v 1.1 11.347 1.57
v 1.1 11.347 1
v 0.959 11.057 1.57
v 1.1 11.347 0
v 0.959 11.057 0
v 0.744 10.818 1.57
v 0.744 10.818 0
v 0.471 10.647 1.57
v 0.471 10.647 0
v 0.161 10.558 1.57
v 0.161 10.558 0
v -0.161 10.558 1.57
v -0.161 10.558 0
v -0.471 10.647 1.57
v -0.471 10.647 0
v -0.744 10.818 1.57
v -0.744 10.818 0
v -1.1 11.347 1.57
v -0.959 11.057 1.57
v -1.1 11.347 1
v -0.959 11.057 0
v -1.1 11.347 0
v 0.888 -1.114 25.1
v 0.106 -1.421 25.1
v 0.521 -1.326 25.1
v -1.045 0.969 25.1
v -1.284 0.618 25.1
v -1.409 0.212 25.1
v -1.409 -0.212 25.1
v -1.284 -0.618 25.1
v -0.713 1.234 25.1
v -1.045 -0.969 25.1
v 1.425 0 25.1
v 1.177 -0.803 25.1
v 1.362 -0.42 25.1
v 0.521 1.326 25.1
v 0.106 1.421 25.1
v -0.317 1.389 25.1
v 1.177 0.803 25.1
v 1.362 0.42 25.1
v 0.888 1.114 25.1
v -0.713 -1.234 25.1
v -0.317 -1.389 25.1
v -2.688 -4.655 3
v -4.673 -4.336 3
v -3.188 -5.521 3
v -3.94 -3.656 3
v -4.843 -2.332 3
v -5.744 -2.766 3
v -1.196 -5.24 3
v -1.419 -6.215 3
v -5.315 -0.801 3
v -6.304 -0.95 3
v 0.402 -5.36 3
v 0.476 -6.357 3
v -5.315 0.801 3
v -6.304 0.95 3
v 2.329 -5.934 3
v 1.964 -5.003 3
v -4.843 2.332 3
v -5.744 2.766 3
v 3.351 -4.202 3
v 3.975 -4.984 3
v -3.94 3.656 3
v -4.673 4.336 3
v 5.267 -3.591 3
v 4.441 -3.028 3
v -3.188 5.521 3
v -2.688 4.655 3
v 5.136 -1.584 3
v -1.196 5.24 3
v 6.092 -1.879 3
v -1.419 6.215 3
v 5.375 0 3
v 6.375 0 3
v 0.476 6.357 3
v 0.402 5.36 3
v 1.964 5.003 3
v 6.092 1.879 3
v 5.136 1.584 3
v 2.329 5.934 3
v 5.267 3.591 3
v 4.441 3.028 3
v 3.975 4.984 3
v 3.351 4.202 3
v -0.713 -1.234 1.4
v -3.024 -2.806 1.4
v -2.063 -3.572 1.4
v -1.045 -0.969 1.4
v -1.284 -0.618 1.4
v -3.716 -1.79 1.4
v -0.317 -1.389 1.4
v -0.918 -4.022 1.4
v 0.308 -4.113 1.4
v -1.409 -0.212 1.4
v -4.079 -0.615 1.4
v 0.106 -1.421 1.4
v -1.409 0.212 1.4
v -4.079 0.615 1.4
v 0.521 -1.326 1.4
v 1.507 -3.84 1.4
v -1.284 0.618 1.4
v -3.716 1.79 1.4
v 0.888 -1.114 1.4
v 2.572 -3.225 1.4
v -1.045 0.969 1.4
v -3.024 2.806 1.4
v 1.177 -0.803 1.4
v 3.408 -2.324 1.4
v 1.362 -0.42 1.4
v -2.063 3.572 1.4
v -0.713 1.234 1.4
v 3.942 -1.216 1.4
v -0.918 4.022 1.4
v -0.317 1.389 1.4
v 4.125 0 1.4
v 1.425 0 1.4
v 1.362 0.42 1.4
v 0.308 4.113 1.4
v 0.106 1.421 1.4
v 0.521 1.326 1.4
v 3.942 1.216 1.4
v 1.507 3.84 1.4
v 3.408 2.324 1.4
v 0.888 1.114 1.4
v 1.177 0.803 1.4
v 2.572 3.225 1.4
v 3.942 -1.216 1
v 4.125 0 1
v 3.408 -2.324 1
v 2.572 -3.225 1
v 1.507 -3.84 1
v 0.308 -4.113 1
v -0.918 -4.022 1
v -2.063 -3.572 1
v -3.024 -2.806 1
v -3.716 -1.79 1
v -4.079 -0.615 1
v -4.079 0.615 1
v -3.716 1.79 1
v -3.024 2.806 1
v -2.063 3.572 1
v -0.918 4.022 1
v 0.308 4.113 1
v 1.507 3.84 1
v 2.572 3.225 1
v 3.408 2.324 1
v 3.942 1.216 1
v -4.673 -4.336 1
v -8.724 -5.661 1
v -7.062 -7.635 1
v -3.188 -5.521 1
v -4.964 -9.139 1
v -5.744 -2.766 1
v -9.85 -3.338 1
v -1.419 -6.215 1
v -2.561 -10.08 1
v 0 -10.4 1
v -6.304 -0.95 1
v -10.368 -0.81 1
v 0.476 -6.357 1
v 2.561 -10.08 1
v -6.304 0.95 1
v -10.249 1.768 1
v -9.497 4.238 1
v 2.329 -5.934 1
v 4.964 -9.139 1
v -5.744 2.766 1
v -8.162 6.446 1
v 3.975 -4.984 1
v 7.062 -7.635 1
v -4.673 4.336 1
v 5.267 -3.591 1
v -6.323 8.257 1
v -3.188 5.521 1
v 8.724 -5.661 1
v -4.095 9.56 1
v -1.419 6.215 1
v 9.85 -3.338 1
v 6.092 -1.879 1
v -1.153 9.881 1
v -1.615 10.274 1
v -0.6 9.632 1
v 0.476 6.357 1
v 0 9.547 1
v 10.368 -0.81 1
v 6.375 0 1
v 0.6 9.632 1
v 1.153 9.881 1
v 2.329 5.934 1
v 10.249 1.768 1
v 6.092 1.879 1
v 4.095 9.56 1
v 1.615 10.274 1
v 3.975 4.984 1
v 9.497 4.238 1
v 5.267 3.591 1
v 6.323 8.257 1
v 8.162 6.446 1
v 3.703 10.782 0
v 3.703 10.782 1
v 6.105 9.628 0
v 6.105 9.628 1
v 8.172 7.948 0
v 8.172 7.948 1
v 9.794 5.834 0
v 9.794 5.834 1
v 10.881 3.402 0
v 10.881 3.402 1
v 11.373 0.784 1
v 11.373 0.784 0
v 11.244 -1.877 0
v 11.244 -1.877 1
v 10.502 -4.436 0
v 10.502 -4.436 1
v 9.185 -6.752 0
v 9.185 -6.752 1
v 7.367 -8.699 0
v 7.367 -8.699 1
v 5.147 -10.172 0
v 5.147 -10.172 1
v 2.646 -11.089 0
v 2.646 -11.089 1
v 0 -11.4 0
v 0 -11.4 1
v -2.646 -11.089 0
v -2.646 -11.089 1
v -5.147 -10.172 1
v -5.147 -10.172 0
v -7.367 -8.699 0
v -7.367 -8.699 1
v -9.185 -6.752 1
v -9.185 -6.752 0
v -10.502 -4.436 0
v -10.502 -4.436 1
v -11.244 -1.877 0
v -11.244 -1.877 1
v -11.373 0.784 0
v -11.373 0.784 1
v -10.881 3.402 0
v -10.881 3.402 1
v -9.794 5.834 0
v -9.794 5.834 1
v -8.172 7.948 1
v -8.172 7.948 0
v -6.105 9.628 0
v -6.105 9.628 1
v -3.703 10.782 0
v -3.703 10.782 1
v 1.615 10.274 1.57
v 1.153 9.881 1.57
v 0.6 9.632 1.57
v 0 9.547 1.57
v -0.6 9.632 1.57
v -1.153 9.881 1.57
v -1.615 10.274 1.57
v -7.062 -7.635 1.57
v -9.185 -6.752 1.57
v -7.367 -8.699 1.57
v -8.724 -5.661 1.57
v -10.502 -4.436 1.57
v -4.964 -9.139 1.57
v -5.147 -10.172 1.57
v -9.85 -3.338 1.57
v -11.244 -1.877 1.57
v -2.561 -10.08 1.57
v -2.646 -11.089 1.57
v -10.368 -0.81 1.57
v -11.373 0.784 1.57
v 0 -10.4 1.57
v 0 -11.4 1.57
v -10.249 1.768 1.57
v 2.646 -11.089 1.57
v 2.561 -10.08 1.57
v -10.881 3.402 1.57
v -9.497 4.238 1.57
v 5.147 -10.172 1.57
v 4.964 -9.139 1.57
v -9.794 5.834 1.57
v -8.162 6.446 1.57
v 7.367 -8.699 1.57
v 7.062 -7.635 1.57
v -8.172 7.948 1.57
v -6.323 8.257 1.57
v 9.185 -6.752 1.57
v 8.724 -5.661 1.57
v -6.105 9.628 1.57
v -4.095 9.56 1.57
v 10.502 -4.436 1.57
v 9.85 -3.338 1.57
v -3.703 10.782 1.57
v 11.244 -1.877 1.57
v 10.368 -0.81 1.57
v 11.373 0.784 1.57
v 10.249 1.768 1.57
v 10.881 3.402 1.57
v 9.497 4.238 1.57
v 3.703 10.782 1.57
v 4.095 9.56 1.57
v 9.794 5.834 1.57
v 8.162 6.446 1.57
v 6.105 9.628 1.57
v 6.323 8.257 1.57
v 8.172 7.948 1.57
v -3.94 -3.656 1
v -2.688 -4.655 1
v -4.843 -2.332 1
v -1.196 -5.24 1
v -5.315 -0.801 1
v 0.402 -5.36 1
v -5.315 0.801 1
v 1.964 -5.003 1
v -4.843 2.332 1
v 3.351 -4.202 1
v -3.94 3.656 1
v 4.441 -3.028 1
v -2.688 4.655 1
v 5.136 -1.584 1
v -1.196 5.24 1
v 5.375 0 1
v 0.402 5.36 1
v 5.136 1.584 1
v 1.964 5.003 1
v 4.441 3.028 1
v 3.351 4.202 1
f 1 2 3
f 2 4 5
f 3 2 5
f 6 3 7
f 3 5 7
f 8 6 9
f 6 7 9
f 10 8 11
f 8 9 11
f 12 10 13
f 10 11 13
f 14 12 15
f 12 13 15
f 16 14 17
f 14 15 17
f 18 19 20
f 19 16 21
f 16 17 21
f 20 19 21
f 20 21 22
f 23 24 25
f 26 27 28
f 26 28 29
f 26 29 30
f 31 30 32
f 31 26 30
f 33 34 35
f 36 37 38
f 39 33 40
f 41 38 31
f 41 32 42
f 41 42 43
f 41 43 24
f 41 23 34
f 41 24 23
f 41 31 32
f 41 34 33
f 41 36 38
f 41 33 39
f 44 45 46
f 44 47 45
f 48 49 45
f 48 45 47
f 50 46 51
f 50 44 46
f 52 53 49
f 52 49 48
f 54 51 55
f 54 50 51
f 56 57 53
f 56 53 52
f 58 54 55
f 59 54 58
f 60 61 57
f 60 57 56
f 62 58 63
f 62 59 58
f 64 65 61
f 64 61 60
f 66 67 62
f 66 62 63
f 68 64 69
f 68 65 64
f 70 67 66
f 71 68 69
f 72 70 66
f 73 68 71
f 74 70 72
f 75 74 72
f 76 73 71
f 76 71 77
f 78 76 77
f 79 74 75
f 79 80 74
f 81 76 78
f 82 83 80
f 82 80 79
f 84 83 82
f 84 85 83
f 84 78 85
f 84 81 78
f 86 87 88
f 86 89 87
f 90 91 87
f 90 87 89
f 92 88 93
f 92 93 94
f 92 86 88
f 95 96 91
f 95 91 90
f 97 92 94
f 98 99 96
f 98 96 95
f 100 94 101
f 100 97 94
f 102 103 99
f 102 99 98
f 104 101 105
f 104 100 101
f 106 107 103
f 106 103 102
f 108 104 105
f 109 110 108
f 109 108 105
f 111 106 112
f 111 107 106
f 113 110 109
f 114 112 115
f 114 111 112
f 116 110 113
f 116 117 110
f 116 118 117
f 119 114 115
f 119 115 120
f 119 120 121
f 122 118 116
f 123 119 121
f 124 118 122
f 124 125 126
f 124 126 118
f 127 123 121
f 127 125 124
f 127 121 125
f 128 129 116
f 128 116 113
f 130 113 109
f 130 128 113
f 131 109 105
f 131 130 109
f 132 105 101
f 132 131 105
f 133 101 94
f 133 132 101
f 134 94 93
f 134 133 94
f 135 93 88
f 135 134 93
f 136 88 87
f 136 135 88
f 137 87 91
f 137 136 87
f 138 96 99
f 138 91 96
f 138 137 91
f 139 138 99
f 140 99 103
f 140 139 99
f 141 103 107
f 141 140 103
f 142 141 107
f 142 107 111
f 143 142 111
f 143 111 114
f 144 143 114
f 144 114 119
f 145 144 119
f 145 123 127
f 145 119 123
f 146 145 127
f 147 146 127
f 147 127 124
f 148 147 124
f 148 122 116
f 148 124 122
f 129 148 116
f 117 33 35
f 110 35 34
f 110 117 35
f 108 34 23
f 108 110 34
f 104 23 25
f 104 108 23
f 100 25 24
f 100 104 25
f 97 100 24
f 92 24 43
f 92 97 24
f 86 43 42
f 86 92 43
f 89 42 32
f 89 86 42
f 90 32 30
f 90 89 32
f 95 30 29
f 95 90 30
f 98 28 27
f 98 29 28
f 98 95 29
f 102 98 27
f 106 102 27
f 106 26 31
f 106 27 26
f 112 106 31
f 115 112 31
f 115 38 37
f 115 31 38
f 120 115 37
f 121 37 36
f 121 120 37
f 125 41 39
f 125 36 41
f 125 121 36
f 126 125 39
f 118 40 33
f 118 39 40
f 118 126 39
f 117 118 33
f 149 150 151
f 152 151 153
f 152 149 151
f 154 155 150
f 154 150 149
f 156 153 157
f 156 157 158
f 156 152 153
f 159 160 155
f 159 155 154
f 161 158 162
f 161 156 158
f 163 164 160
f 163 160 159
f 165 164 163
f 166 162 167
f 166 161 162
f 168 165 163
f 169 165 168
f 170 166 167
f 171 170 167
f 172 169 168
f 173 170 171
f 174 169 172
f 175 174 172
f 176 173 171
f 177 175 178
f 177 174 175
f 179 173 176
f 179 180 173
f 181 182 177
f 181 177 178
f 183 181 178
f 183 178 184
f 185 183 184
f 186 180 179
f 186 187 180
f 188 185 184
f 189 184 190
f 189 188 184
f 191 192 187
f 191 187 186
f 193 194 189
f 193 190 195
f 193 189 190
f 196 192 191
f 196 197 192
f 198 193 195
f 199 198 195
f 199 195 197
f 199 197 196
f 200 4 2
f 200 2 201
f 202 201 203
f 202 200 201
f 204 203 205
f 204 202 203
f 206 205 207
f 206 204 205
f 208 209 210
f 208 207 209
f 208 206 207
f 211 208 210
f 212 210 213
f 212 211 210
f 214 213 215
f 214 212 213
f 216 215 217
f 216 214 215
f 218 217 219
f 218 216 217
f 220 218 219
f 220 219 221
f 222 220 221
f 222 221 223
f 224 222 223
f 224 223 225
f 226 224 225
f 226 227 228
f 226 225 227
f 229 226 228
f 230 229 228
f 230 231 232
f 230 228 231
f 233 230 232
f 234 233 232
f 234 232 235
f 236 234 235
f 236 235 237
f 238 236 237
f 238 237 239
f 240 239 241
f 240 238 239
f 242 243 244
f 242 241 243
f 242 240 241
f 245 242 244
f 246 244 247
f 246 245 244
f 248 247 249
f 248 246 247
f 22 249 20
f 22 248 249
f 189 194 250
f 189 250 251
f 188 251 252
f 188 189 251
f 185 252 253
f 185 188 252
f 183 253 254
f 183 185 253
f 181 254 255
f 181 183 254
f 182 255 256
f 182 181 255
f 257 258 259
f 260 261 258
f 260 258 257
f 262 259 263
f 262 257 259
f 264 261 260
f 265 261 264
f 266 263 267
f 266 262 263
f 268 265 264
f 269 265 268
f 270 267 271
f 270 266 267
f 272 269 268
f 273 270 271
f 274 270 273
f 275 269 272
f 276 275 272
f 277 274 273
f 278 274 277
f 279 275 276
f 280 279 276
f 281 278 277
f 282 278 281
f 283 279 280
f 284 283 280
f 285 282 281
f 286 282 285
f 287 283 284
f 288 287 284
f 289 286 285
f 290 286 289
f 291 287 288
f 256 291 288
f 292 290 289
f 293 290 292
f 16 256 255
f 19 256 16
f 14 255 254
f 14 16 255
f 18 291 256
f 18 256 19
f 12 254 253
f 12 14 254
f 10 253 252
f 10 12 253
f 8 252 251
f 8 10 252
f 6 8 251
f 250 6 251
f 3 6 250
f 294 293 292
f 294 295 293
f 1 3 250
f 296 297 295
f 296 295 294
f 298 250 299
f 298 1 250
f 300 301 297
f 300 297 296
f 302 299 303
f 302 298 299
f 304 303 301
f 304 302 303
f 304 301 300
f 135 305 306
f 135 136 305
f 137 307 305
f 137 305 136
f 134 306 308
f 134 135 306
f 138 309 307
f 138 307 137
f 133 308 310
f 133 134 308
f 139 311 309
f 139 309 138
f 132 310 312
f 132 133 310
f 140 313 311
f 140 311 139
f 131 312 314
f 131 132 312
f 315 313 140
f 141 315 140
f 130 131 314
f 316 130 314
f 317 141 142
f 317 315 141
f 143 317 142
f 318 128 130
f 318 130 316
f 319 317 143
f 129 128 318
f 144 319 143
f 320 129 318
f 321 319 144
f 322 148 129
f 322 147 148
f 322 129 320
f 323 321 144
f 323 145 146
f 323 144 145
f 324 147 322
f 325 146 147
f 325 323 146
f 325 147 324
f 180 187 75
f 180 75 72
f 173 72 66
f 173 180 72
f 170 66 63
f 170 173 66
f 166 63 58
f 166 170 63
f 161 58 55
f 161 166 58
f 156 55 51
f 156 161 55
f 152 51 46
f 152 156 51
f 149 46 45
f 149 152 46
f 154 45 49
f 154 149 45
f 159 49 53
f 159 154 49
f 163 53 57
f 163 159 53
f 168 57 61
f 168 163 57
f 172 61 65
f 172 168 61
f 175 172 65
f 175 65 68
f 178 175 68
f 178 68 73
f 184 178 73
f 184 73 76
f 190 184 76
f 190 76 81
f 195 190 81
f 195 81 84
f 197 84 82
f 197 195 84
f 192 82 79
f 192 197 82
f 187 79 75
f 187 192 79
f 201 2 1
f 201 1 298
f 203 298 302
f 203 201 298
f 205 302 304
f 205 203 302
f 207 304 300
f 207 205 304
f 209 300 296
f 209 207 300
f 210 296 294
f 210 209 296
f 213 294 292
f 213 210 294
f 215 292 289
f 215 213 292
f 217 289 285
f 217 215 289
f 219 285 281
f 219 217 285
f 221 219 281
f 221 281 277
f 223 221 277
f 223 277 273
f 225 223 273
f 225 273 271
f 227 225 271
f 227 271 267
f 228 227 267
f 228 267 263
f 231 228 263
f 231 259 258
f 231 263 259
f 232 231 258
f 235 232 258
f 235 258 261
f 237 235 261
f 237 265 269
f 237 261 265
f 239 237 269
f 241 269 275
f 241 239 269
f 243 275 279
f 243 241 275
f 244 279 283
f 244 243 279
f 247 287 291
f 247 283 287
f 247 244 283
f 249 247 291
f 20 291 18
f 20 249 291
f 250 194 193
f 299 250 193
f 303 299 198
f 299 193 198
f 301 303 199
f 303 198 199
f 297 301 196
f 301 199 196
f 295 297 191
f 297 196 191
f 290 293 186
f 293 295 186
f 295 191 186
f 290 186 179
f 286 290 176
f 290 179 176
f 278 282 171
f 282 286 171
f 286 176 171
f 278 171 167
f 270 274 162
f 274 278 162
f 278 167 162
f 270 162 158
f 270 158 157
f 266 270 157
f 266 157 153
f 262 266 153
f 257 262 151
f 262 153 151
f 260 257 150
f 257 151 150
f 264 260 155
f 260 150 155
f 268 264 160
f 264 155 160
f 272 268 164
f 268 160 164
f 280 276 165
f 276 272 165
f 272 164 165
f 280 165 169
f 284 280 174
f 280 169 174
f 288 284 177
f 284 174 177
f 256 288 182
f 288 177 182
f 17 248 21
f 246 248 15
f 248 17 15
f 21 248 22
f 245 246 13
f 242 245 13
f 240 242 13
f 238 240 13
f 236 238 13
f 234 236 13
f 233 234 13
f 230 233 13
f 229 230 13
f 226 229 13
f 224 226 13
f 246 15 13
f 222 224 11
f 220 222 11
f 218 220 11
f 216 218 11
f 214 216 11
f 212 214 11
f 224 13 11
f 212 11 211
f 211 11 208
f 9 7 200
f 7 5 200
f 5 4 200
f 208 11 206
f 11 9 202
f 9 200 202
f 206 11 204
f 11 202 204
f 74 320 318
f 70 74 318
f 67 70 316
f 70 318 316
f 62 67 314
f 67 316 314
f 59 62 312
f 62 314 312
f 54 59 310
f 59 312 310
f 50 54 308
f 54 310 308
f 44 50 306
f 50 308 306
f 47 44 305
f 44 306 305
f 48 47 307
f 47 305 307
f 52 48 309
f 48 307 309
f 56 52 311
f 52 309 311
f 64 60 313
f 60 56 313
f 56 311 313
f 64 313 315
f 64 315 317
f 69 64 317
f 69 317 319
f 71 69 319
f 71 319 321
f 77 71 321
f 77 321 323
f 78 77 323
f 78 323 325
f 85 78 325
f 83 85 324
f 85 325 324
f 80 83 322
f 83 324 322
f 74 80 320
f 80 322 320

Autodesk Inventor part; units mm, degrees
sketch "Sketch1" plane through (0, 0, 0) normal (0, 0, 1) x (1, 0, 0)
  circle A0 centre (0, 0) radius 11.4
  dimension "d0" = 22.8
extrude "Extrusion1" add sketch "Sketch1" along normal blind 1
ref_plane "Work Plane1" through (0, 0, 1) normal (0, 0, 1) x (1, 0, 0)
sketch "Sketch3" plane through (0, 0, 1) normal (0, 0, 1) x (1, 0, 0)
  circle A0 centre (0, 0) radius 6.375
  circle A1 centre (0, 0) radius 5.375
  dimension "d6" = 12.75
  dimension "d7" = 10.75
extrude "Extrusion3" add sketch "Sketch3" along normal blind 2
ref_plane "Work Plane3" through (0, 0, 1) normal (0, 0, 1) x (1, 0, 0)
sketch "Sketch4" plane through (0, 0, 1) normal (0, 0, 1) x (1, 0, 0)
  circle A0 centre (0, 0) radius 1.425
  dimension "d10" = 2.85
extrude "Extrusion4" add sketch "Sketch4" along normal blind 24.1
ref_plane "Work Plane2" through (0, 0, 1) normal (0, 0, 1) x (1, 0, 0)
sketch "Sketch5" plane through (0, 0, 1) normal (0, 0, 1) x (1, 0, 0)
  circle A0 centre (0, 0) radius 4.125
  dimension "d14" = 8.25
extrude "Extrusion5" add sketch "Sketch5" along normal blind 0.4
sketch "Sketch7" plane through (0, 0, 1) normal (0, 0, 1) x (1, 0, 0)
  circle A0 centre (0, 0) radius 11.4
  line L0 (-1.1, 11.3468) -> (1.1, 11.3468) construction
  line L1 (0, 11.3468) -> (0, 10.5468) construction
  arc A1 (-1.1, 11.3468) -> (1.1, 11.3468) centre (0, 11.7031) ccw
  dimension "d17" = 2.2
  dimension "d18" = 0.8
extrude "Extrusion6" cut sketch "Sketch7" against normal up to surface (1 mm away) contours A1 A0 picked at (-0.044, 11.1142)
sketch "Sketch8" plane through (0, 0, 1) normal (0, 0, 1) x (1, 0, 0)
  arc A0 (-1.1, 11.3468) -> (1.1, 11.3468) centre (0, 11.7031) ccw projected
  arc A1 (-1.1, 11.3468) -> (1.1, 11.3468) centre (0, 0) ccw projected
  circle A2 centre (0, 0) radius 6.375 projected
  arc A3 (-1.6146, 10.2739) -> (1.6146, 10.2739) centre (0, 11.7031) ccw
  arc A4 (-1.6146, 10.2739) -> (1.6146, 10.2739) centre (0, 0) ccw
  dimension "d21" = 1
extrude "Extrusion7" add sketch "Sketch8" along normal blind 0.57 contours A0 A1
properties part number "PMSeal"
